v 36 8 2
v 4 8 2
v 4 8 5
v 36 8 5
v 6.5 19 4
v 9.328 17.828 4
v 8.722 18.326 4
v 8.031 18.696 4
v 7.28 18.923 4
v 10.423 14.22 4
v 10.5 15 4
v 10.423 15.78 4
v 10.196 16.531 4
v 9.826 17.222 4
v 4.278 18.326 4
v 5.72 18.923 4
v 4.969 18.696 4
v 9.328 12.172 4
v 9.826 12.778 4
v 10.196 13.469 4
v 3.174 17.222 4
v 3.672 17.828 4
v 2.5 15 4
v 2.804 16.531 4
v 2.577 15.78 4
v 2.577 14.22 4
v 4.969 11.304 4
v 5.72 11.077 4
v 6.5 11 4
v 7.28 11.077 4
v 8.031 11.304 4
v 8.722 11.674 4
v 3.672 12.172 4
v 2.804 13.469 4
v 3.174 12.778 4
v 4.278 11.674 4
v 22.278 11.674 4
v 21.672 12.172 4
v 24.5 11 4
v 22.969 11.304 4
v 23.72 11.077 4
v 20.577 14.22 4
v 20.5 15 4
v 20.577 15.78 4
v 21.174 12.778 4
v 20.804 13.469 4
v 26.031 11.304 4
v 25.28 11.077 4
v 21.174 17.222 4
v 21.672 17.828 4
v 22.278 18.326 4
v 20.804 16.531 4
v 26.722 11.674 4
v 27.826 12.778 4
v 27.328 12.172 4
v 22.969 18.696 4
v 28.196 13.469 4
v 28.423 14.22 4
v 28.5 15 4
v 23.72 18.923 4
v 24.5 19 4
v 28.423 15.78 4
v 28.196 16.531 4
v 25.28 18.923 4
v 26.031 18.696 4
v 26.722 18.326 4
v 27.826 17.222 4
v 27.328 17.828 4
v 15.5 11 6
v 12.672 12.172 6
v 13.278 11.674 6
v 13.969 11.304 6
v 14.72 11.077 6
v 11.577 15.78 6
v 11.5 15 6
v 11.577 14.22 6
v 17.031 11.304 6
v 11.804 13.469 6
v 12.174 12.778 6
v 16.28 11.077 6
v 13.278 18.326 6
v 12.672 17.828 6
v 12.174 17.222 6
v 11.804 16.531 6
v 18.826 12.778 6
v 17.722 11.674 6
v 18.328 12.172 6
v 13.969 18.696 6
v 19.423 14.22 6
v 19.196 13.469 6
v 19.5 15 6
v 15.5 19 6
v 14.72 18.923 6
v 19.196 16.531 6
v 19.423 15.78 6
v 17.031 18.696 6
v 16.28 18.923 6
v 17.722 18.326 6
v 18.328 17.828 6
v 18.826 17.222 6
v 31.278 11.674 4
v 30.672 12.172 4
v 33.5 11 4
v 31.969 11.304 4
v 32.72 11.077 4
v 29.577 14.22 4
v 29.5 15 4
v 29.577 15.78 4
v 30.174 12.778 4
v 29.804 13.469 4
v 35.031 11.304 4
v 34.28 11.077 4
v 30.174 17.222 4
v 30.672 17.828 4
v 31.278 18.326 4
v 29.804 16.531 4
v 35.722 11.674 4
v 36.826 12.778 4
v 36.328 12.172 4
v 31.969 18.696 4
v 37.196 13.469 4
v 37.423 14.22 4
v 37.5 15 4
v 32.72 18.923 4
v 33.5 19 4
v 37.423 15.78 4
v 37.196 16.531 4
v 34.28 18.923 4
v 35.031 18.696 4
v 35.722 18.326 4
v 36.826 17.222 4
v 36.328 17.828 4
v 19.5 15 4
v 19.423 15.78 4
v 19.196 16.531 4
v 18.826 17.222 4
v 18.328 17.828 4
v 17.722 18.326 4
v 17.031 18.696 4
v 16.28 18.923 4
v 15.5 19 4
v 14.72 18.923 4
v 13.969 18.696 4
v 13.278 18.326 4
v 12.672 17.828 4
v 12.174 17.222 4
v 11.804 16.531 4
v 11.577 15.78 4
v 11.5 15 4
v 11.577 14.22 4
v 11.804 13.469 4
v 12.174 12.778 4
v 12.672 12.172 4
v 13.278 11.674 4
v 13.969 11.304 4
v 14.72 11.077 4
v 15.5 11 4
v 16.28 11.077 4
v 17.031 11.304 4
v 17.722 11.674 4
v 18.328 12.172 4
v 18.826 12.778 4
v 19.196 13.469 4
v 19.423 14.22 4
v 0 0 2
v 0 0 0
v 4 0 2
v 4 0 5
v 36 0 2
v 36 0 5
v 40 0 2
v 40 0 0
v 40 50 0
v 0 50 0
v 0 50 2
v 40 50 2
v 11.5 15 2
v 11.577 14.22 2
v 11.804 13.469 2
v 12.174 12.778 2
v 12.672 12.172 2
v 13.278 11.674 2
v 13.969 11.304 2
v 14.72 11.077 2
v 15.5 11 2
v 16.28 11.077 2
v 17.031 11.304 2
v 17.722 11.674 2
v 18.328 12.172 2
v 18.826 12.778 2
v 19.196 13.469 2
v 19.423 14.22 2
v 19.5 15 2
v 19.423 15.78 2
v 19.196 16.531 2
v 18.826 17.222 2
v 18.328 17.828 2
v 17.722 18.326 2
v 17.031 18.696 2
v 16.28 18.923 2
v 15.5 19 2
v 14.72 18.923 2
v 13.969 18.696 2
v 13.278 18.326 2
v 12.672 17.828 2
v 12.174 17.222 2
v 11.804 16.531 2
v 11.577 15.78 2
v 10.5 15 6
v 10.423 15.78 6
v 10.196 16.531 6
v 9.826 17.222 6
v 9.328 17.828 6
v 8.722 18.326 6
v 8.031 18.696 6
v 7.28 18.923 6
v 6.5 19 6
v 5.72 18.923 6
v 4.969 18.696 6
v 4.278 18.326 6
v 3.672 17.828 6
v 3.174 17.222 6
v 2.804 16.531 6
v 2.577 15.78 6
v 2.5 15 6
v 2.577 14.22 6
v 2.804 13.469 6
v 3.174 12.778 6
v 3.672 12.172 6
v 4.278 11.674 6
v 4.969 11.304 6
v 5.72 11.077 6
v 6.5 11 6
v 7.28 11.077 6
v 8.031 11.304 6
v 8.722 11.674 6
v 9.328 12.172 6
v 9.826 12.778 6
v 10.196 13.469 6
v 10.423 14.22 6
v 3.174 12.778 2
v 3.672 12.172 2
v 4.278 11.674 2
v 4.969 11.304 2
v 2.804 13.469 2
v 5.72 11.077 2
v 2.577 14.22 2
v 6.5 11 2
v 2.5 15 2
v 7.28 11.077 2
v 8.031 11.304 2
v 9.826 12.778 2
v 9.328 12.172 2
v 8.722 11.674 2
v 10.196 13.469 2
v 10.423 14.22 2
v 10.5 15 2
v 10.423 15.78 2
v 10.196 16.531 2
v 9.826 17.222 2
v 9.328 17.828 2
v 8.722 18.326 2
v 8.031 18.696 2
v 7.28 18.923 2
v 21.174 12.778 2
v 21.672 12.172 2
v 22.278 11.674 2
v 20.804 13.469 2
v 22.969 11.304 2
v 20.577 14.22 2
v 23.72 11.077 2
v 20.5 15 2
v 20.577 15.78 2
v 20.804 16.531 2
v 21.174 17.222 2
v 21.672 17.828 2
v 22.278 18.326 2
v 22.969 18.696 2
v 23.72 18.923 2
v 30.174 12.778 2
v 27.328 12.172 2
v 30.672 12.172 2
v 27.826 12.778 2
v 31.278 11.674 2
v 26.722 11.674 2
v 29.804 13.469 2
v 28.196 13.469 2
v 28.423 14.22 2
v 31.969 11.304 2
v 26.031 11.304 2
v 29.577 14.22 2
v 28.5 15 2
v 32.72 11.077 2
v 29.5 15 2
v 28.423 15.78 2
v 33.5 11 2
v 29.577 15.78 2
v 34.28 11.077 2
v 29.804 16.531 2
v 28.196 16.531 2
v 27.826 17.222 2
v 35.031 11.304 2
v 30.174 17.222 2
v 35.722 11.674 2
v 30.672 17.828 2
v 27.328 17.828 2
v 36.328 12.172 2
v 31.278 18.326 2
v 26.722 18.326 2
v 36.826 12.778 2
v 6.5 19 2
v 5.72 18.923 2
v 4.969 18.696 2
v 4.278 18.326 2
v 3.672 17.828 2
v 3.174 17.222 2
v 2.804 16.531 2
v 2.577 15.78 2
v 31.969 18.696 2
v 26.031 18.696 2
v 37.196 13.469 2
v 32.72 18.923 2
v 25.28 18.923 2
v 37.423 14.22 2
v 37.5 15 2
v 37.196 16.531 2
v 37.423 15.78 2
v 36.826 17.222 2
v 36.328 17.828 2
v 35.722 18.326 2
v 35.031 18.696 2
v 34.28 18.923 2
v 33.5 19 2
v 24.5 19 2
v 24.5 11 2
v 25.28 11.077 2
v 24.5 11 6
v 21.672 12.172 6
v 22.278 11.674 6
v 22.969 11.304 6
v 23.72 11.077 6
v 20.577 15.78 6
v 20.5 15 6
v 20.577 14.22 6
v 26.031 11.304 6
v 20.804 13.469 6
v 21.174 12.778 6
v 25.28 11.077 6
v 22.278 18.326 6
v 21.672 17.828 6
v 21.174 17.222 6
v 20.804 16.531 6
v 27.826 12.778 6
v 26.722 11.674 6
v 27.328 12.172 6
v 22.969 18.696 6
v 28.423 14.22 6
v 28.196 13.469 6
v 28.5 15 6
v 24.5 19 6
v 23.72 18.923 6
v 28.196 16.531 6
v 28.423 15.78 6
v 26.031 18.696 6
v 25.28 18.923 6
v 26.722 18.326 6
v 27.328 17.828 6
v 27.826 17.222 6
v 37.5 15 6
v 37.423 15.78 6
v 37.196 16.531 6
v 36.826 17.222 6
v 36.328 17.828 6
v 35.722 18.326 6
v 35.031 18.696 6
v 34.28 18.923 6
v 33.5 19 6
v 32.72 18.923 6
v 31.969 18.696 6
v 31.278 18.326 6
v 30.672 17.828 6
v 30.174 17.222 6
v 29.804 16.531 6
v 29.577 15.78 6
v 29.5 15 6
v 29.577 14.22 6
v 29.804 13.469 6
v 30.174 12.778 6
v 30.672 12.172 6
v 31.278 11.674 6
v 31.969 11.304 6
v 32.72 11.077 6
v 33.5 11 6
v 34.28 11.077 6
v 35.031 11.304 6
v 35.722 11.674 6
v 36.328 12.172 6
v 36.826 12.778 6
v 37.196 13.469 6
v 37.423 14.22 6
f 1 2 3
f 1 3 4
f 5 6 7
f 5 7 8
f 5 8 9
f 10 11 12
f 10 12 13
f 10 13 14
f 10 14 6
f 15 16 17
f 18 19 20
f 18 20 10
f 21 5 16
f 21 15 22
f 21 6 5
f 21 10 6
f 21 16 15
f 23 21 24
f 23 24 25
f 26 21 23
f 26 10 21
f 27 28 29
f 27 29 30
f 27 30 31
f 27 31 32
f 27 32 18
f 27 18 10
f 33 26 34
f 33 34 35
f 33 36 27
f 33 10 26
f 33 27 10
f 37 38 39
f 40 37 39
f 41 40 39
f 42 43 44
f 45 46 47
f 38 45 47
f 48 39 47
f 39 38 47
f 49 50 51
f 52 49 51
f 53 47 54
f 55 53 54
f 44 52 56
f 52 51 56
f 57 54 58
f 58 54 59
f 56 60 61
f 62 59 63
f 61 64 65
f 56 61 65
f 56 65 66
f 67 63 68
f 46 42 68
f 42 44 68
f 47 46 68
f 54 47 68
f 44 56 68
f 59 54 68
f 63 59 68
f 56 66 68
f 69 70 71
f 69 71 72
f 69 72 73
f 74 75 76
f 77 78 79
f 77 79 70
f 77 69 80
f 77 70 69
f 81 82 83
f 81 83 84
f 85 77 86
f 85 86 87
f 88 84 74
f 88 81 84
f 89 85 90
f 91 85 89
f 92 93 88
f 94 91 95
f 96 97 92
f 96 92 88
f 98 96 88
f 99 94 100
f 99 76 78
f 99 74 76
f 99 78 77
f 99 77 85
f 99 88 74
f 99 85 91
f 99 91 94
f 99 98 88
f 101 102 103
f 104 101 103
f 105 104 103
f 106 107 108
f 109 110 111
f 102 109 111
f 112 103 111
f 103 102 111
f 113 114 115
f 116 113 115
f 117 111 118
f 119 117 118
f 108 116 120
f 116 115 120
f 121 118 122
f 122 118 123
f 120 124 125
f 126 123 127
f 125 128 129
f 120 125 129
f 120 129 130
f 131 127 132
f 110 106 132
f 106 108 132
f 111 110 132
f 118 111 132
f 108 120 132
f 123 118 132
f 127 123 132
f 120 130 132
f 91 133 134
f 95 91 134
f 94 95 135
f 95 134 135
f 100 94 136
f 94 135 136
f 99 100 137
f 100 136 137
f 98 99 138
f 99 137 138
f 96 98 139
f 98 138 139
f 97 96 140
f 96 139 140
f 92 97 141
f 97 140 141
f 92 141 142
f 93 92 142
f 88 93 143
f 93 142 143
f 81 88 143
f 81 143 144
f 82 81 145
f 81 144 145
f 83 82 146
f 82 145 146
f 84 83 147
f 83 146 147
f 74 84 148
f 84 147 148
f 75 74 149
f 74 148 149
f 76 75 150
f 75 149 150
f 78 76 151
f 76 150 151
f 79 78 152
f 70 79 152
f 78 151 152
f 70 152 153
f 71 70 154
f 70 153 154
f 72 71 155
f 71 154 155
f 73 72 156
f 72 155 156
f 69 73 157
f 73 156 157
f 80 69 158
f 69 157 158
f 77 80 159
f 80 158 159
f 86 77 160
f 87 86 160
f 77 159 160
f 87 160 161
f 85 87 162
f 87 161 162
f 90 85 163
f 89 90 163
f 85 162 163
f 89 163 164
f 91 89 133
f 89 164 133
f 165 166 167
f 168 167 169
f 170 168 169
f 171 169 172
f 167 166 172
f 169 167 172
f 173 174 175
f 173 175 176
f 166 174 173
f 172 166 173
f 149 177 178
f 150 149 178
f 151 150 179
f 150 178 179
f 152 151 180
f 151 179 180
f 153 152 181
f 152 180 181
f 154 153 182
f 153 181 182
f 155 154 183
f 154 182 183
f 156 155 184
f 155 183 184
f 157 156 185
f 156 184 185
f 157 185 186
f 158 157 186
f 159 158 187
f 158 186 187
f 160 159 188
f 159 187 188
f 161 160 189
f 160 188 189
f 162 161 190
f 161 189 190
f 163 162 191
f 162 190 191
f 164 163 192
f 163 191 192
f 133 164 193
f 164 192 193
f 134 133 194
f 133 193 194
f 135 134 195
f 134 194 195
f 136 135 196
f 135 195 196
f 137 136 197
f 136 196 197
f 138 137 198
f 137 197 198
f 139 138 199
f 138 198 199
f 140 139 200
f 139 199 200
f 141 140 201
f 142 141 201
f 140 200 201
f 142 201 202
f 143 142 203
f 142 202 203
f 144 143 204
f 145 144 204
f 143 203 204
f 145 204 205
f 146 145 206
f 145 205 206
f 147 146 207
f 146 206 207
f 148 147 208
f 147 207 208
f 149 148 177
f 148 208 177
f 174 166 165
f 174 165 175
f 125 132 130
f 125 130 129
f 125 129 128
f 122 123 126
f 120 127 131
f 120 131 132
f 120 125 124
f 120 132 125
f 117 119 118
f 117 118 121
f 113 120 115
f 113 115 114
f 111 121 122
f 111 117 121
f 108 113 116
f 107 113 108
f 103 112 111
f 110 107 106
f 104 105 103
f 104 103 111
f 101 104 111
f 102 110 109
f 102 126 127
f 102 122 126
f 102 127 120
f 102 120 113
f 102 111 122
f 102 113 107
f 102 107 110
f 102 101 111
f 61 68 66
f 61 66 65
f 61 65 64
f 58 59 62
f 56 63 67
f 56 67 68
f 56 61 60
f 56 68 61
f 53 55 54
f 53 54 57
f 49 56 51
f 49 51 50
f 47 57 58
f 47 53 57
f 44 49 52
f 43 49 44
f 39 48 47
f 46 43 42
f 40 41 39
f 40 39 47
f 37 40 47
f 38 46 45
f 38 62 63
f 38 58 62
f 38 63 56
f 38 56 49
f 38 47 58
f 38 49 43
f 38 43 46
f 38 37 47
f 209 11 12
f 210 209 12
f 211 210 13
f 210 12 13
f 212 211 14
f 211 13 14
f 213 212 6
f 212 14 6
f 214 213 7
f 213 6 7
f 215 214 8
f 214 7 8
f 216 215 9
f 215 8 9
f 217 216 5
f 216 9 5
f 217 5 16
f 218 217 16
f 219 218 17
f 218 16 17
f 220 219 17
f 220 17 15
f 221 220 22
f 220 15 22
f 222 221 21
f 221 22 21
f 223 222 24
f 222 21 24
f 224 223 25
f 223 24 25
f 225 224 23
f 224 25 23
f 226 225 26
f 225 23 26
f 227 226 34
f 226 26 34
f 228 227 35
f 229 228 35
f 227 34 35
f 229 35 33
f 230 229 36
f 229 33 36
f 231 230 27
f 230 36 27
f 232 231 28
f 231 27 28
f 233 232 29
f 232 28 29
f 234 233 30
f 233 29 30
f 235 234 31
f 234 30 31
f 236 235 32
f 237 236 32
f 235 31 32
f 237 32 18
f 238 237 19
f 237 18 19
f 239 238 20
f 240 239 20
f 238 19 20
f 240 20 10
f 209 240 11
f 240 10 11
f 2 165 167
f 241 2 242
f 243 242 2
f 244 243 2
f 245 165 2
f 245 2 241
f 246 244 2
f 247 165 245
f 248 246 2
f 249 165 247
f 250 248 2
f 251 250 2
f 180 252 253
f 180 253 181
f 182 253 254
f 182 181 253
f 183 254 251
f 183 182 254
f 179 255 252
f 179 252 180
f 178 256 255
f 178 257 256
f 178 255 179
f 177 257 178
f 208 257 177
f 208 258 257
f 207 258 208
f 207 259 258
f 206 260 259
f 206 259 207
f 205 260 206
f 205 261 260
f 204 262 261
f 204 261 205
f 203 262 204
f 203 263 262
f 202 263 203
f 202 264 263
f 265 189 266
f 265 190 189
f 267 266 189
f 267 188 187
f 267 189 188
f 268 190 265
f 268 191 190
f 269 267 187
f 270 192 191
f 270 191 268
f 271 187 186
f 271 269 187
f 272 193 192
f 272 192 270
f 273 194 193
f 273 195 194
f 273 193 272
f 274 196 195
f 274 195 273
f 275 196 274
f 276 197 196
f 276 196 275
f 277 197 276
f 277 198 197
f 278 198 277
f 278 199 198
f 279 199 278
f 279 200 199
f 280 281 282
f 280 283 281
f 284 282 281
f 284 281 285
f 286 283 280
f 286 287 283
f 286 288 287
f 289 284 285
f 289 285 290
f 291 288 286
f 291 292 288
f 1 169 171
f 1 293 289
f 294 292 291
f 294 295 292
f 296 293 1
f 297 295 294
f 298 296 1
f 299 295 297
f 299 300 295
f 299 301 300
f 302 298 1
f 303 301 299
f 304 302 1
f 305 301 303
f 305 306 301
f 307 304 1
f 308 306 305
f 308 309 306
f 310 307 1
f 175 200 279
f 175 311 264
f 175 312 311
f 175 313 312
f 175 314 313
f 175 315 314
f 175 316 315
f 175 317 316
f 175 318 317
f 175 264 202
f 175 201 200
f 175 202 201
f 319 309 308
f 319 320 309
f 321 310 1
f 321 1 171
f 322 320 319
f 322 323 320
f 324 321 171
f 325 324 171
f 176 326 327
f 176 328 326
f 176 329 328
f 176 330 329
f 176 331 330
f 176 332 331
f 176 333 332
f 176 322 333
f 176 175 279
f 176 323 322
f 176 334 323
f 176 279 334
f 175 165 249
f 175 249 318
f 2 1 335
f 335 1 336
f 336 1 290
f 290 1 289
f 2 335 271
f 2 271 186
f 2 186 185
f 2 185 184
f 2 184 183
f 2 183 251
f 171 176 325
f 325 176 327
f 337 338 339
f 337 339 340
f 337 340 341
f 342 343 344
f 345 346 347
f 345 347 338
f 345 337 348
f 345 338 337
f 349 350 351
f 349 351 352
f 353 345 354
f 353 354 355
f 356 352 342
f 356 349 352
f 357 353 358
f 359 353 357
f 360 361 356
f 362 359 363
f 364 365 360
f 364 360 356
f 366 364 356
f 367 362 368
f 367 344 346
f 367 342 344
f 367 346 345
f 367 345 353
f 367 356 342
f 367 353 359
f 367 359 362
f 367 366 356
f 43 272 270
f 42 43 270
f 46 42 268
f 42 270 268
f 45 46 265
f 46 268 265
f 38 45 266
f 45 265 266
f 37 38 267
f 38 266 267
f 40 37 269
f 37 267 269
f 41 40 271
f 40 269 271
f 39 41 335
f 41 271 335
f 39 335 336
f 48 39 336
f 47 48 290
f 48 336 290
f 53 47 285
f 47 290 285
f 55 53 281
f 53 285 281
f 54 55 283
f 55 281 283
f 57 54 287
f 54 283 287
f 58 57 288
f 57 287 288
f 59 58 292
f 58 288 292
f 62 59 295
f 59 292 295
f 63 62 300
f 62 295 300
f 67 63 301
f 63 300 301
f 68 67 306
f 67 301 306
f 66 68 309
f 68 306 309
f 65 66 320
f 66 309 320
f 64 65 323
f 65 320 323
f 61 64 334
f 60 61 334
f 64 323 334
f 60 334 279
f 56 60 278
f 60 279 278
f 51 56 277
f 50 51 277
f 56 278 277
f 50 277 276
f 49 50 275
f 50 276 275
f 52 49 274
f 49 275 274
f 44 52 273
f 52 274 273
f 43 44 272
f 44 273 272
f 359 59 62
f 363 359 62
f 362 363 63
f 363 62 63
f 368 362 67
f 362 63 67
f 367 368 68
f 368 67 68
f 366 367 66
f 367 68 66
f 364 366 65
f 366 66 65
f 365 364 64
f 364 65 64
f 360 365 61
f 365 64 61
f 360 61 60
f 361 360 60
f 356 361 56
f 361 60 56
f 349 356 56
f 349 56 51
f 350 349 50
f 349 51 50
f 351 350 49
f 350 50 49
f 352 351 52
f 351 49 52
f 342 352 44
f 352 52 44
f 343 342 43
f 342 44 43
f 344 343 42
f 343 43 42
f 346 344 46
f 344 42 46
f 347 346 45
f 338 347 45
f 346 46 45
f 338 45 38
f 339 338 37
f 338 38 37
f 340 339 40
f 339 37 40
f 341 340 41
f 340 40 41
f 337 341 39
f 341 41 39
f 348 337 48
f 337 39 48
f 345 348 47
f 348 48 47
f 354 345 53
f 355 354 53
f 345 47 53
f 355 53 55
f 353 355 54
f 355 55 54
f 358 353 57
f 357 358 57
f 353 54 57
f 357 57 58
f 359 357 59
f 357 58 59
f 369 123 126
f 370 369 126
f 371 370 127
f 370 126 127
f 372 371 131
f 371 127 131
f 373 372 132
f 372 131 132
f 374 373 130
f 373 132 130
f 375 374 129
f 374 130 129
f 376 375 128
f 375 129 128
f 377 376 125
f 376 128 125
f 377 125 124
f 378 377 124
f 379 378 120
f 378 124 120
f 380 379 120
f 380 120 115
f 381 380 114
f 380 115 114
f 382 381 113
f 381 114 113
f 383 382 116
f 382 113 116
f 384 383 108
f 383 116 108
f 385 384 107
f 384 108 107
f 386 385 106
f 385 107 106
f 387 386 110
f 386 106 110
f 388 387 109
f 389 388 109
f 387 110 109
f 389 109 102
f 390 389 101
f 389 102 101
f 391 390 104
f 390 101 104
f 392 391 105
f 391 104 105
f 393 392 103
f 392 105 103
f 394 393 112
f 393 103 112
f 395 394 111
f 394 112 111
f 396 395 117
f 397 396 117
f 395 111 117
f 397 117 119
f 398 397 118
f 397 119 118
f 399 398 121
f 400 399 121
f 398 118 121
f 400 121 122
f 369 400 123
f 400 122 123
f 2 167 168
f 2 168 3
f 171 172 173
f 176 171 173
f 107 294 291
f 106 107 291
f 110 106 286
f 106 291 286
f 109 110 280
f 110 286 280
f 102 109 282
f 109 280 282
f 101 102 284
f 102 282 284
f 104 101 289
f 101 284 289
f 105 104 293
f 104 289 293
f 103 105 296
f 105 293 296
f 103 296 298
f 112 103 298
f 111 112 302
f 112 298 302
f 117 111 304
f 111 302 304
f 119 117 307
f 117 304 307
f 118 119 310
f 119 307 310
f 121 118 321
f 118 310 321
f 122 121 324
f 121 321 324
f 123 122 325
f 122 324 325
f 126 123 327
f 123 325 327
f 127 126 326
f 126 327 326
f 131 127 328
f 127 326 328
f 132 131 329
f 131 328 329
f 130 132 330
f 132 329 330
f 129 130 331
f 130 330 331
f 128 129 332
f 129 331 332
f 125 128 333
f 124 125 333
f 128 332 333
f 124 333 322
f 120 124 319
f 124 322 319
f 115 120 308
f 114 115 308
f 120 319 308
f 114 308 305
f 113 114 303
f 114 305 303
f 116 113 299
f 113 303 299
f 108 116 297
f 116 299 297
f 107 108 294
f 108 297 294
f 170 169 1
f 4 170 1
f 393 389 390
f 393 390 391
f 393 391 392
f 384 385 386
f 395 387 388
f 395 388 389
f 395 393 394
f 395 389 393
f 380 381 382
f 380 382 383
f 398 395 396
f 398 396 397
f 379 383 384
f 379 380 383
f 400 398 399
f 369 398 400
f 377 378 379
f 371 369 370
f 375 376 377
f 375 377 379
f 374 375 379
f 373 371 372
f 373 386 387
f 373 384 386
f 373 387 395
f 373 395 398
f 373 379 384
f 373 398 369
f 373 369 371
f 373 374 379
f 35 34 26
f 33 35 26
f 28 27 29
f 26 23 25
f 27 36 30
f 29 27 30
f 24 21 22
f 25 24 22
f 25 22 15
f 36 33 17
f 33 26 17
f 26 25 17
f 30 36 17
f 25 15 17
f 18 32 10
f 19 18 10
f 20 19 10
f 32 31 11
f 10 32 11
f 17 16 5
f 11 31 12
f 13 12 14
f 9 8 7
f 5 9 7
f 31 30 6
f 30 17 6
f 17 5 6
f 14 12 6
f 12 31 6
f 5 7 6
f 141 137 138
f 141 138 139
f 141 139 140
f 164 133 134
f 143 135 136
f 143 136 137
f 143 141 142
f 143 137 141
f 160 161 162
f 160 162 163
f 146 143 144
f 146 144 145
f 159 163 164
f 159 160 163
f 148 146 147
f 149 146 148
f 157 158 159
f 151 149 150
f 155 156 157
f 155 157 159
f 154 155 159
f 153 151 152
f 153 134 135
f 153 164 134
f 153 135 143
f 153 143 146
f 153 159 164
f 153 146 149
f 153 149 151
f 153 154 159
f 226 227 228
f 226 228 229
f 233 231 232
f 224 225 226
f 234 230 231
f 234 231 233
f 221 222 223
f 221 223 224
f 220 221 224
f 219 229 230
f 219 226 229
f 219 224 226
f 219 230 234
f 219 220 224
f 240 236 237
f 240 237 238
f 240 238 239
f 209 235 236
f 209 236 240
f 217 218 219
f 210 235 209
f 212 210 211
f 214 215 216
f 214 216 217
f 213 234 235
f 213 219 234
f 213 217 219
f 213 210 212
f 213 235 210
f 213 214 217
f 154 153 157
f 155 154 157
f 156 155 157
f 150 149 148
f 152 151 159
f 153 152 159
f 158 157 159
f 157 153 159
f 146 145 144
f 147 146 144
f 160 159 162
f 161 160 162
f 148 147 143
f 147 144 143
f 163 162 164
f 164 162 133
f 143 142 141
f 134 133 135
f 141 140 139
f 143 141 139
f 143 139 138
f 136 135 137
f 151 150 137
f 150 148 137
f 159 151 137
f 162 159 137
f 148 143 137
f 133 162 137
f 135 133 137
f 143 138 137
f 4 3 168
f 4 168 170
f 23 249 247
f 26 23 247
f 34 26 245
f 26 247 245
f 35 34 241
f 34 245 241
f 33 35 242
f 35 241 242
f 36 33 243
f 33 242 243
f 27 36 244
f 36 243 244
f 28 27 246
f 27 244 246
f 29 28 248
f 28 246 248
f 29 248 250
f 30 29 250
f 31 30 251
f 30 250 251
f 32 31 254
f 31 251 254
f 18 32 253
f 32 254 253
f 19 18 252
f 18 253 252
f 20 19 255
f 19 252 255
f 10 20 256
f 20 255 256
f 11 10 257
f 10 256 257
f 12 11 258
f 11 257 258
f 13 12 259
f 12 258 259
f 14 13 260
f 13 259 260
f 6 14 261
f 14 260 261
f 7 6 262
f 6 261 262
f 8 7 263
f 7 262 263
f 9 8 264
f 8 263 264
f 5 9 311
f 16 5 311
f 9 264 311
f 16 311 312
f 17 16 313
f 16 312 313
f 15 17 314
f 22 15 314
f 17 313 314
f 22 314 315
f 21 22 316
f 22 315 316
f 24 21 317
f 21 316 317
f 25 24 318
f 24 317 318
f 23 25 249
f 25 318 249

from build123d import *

# Parameters (mm, degrees)
SKETCH_1_W      = 40
SKETCH_1_H      = 50
EXTRUDE_1_DEPTH = 2
SKETCH_2_R      = 4
EXTRUDE_2_DEPTH = 2
SKETCH_3_R      = 4
EXTRUDE_3_DEPTH = 2
SKETCH_4_R      = 4
EXTRUDE_4_DEPTH = 2
SKETCH_5_R      = 4
EXTRUDE_5_DEPTH = 2
SKETCH_7_R      = 4
EXTRUDE_6_DEPTH = 2
SKETCH_8_W      = 32
SKETCH_8_H      = 8
EXTRUDE_7_DEPTH = 3


with BuildPart() as part:
    # 草图1 → 凸台-拉伸1 (new body)
    with BuildSketch(Plane.XY):
        with Locations((20, 25)):
            Rectangle(SKETCH_1_W, SKETCH_1_H)
    extrude(amount=EXTRUDE_1_DEPTH)

    # 草图2 → 凸台-拉伸2 (add)
    with BuildSketch(Plane.XY.offset(2)):
        with Locations(Location((6.5, 15, 0), (0, 0, 180))):
            Circle(SKETCH_2_R)
        with Locations(Location((15.5, 15, 0), (0, 0, 180))):
            Circle(SKETCH_2_R)
        with Locations(Location((24.5, 15, 0), (0, 0, 180))):
            Circle(SKETCH_2_R)
        with Locations(Location((33.5, 15, 0), (0, 0, 180))):
            Circle(SKETCH_2_R)
    extrude(amount=EXTRUDE_2_DEPTH)

    # 草图8 → 凸台-拉伸7 (add)
    with BuildSketch(Plane.XY.offset(2)):
        with Locations((20, 4)):
            Rectangle(SKETCH_8_W, SKETCH_8_H)
    extrude(amount=EXTRUDE_7_DEPTH)


with BuildPart() as body_2:
    # 草图3 → 凸台-拉伸3 (new body)
    with BuildSketch(Plane.XY.offset(4)):
        with Locations((6.5, 15)):
            Circle(SKETCH_3_R)
    extrude(amount=EXTRUDE_3_DEPTH)


with BuildPart() as body_3:
    # 草图4 → 凸台-拉伸4 (new body)
    with BuildSketch(Plane.XY.offset(4)):
        with Locations((15.5, 15)):
            Circle(SKETCH_4_R)
    extrude(amount=EXTRUDE_4_DEPTH)


with BuildPart() as body_4:
    # 草图5 → 凸台-拉伸5 (new body)
    with BuildSketch(Plane.XY.offset(4)):
        with Locations((24.5, 15)):
            Circle(SKETCH_5_R)
    extrude(amount=EXTRUDE_5_DEPTH)


with BuildPart() as body_5:
    # 草图7 → 凸台-拉伸6 (new body)
    with BuildSketch(Plane.XY.offset(4)):
        with Locations((33.5, 15)):
            Circle(SKETCH_7_R)
    extrude(amount=EXTRUDE_6_DEPTH)


solid = Compound([part.part, body_2.part, body_3.part, body_4.part, body_5.part])
